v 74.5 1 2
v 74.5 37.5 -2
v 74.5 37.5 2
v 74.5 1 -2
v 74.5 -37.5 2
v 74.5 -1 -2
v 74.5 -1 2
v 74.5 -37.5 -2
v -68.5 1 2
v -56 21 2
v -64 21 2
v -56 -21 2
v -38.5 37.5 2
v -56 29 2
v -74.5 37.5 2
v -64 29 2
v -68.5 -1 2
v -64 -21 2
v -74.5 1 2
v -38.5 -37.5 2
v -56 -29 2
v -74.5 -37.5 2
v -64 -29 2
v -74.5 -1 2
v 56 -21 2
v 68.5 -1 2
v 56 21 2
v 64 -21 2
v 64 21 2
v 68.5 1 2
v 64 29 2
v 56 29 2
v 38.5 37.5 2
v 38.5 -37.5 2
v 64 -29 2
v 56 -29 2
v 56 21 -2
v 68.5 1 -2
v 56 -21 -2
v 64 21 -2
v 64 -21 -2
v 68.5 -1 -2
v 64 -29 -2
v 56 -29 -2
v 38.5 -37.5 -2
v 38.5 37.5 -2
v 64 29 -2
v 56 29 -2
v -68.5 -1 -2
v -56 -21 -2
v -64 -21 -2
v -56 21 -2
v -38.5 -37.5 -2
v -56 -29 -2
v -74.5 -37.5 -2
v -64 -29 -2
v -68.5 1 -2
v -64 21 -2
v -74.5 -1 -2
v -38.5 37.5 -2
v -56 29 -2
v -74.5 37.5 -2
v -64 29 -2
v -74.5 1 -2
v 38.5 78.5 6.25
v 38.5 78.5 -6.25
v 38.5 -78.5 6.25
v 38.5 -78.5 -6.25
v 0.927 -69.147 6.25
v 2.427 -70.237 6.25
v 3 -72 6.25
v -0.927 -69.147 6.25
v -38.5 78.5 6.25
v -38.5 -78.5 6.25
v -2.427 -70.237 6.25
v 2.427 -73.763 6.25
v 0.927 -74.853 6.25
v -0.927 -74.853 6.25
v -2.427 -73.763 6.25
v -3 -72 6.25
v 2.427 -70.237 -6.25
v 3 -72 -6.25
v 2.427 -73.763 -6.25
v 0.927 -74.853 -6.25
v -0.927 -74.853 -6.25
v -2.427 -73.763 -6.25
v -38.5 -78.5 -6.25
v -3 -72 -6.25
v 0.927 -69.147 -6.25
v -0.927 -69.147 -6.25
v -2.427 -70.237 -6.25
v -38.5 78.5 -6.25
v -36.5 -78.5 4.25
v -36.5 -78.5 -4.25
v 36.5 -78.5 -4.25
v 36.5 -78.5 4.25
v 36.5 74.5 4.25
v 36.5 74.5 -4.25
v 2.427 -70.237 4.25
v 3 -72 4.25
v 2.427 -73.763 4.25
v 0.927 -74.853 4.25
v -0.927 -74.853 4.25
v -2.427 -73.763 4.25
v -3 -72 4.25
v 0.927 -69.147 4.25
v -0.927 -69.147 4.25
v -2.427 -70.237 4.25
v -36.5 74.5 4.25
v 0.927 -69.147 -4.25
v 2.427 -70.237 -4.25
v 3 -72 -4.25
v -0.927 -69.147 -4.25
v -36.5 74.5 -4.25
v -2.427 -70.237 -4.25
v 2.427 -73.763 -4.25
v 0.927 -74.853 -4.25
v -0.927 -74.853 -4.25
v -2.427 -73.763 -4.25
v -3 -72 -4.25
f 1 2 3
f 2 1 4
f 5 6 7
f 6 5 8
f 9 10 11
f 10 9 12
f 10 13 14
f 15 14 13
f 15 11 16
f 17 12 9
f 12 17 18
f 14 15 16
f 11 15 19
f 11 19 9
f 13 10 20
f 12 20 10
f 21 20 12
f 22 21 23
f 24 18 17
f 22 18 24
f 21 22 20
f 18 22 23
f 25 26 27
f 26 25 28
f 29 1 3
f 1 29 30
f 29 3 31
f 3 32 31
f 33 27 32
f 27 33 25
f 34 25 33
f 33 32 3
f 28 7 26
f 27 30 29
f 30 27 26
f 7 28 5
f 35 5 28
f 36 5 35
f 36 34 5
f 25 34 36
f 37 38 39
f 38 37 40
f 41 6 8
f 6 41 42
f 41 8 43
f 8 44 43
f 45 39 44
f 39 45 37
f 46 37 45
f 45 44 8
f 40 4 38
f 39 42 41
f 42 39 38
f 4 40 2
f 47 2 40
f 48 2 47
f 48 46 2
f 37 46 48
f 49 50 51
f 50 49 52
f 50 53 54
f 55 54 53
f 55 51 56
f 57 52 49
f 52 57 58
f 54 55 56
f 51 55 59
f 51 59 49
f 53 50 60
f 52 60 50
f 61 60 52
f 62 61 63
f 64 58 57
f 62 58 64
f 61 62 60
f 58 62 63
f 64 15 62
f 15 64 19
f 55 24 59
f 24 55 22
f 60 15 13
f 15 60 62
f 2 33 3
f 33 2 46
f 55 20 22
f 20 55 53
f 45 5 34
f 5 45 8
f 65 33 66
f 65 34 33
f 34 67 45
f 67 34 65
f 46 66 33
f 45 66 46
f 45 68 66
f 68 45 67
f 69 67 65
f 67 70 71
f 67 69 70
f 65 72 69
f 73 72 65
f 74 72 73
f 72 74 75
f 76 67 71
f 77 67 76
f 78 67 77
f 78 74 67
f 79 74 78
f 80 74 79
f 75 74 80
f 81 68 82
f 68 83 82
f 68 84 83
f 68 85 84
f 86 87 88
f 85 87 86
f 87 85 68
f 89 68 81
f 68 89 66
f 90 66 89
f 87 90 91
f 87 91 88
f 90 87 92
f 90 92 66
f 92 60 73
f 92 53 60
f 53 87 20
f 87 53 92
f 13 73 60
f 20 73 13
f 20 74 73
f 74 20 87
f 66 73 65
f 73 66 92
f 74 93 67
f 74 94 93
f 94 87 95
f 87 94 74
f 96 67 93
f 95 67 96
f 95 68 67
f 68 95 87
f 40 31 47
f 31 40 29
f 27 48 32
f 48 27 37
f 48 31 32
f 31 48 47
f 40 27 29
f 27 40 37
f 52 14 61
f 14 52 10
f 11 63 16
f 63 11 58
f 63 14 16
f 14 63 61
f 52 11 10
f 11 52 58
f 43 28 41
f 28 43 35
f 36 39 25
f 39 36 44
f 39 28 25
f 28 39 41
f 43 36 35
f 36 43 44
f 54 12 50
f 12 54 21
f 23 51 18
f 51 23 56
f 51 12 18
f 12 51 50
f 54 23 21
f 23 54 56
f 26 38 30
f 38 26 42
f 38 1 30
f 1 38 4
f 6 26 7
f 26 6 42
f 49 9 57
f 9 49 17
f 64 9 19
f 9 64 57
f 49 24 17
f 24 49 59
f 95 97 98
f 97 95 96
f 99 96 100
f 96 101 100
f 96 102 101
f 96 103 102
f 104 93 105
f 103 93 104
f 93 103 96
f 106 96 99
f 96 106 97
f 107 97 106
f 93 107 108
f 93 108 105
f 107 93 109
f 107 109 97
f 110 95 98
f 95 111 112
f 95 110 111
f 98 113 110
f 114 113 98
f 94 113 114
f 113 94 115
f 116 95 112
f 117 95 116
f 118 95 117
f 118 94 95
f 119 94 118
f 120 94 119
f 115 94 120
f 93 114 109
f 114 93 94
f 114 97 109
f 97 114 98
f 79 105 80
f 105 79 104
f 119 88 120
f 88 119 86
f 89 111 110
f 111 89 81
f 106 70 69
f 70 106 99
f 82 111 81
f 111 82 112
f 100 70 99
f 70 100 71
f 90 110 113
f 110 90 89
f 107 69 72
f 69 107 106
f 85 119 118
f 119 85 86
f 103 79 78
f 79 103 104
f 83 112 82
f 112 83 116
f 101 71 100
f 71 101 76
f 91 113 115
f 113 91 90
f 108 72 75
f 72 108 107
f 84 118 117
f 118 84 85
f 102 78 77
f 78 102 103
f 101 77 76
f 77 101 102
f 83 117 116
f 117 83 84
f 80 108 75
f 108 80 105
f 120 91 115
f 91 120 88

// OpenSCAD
Phone_Width=73;
Phone_Length=153;
Phone_Height=8.5;
Side_Holes=8;
Front_Hole=6;

difference(){
    union(){
        translate([0,0,0])
        cube([149,75,4],center=true);
        translate([0,0,0])
        cube([Phone_Width+4,Phone_Length+4,Phone_Height+4],center=true);
    }
    union(){
      translate([60,25,0])  
      cube(Side_Holes, center=true);
      translate([-60,25,0])
      cube(Side_Holes, center=true);  
      translate([60,-25,0])
      cube(Side_Holes, center=true);  
      translate([-60,-25,0])
      cube(Side_Holes, center=true);  
        
      translate([143/2,0,0])  
      cube([6,2,100], center=true); 
      translate([-143/2,0,0])  
      cube([6,2,100], center=true); 
      
      translate([0,-2,0])
      cube([Phone_Width,Phone_Length,Phone_Height], center=true); 
        translate([0,-72,0])
      cylinder(Phone_Height+4,Front_Hole/2,Front_Hole/2, center=true); 
        
        }
}
